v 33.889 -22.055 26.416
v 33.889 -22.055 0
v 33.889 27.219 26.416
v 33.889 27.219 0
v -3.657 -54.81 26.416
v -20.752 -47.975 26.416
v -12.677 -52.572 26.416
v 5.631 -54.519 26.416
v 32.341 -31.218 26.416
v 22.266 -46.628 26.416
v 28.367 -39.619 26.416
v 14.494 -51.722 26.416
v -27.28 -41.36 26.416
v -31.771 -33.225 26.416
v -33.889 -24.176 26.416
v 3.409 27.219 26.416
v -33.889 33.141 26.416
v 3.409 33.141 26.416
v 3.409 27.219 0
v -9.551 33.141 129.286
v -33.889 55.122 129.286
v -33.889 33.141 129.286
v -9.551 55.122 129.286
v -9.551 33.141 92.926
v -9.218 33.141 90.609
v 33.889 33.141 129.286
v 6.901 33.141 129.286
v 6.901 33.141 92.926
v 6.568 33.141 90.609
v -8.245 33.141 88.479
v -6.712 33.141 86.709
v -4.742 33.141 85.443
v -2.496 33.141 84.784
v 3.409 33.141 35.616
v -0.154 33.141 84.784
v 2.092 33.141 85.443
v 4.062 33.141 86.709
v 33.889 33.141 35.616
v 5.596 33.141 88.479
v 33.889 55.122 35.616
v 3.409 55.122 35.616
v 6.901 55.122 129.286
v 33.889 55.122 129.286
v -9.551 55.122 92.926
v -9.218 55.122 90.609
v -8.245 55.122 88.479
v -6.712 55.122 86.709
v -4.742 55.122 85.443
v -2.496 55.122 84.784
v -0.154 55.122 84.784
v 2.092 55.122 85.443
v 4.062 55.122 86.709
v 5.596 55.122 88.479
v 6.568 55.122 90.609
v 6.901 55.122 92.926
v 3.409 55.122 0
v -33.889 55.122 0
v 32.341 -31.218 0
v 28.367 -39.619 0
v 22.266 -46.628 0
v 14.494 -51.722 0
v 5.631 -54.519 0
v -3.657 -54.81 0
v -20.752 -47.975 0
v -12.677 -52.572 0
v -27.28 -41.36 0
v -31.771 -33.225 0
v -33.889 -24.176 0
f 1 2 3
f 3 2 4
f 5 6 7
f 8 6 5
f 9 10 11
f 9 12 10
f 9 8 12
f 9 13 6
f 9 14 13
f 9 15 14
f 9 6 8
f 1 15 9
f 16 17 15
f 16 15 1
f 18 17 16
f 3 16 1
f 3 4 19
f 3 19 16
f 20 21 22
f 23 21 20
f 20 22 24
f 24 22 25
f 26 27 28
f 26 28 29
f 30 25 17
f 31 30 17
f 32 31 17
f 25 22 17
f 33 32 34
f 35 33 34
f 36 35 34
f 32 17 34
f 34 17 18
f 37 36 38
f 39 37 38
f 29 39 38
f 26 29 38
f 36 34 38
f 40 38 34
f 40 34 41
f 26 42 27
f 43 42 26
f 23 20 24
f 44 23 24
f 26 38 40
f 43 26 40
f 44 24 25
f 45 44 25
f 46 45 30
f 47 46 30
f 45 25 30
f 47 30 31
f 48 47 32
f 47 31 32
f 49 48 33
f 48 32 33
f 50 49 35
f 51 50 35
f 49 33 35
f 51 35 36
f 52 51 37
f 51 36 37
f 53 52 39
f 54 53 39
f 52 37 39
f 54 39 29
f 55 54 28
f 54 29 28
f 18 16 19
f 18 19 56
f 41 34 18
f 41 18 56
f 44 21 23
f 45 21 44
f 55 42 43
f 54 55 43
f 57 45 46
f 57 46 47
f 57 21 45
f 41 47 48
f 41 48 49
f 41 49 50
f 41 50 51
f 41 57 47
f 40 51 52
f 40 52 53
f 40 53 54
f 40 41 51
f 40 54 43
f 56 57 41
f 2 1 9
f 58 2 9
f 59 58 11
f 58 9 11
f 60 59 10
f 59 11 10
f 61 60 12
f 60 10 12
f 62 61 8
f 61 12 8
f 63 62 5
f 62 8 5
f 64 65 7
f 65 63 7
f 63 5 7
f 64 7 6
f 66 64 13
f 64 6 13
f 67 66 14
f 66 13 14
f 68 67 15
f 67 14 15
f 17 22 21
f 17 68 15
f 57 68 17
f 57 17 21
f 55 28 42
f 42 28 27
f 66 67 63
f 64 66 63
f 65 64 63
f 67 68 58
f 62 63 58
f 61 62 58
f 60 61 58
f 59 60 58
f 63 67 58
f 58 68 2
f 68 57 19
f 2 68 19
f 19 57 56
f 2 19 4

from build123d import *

# Parameters (mm, degrees)
F0_W      = 67.7789226174
F0_H      = 110.2438345551
F1_DEPTH  = 10.668
F2_W      = 67.7789226174
F2_H      = 21.9810828567
F3_DEPTH  = 84.074
F4_DEPTH  = 15.748
F5_DEPTH  = 34.544
F7_DEPTH  = 25.4
F9_DEPTH  = 64.77
F10_W     = 32.31433779
F10_H     = 40.7657716423
F11_DEPTH = 30.48


with BuildPart() as f1:
    # F0 (on Top) → F1 (new body)
    with BuildSketch(Plane.XY):
        Rectangle(F0_W, F0_H)
    extrude(amount=F1_DEPTH)

    # F2 (on face) → F3 (join)
    with BuildSketch(Plane.XY.offset(10.668)):
        with Locations((0, 44.1313758492)):
            Rectangle(F2_W, F2_H)
    extrude(amount=F3_DEPTH)

    # F4 (add): a face of the model
    f4_faces = [f1.faces().sort_by_distance(p)[0] for p in [
        (0, -10.9905414283, 10.668),
    ]]
    extrude(f4_faces, amount=F4_DEPTH)

    # F5 (add): a face of the model
    f5_faces = [f1.faces().sort_by_distance(p)[0] for p in [
        (0, 44.1313758492, 94.742),
    ]]
    extrude(f5_faces, amount=F5_DEPTH)

    # F6 (on face) → F7 (cut)
    with BuildSketch(Plane.XZ.offset(-33.1408344209)):
        with BuildLine():
            Line((6.9014118053, 129.286), (-9.5512475818, 129.286))
            Line((-9.5512475818, 129.286), (-9.5512475818, 92.9261893034))
            ThreePointArc((-9.5512475818, 92.9261893034), (-1.3249178883, 84.6998596098), (6.9014118053, 92.9261893034))
            Line((6.9014118053, 92.9261893034), (6.9014118053, 129.286))
        make_face()
    extrude(amount=-F7_DEPTH, mode=Mode.SUBTRACT)

    # F8 (on face) → F9 (cut)
    with BuildSketch(Plane.XY.offset(26.416)):
        with BuildLine():
            ThreePointArc((33.8894613087, -22.0553063396), (0.997184828, -54.9834271284), (-33.8894613087, -24.1762053761))
            Line((-33.8894613087, -24.1762053761), (-33.8894613087, -55.1219172776))
            Line((-33.8894613087, -55.1219172776), (33.8894613087, -55.1219172776))
            Line((33.8894613087, -55.1219172776), (33.8894613087, -22.0553063396))
        make_face()
    extrude(amount=-F9_DEPTH, mode=Mode.SUBTRACT)

    # F10 (on face) → F11 (cut)
    with BuildSketch(Plane.YZ.offset(33.8894613087)):
        with Locations((43.3757714927, 15.2329867706)):
            Rectangle(F10_W, F10_H)
    extrude(amount=-F11_DEPTH, mode=Mode.SUBTRACT)


solid = f1.part
